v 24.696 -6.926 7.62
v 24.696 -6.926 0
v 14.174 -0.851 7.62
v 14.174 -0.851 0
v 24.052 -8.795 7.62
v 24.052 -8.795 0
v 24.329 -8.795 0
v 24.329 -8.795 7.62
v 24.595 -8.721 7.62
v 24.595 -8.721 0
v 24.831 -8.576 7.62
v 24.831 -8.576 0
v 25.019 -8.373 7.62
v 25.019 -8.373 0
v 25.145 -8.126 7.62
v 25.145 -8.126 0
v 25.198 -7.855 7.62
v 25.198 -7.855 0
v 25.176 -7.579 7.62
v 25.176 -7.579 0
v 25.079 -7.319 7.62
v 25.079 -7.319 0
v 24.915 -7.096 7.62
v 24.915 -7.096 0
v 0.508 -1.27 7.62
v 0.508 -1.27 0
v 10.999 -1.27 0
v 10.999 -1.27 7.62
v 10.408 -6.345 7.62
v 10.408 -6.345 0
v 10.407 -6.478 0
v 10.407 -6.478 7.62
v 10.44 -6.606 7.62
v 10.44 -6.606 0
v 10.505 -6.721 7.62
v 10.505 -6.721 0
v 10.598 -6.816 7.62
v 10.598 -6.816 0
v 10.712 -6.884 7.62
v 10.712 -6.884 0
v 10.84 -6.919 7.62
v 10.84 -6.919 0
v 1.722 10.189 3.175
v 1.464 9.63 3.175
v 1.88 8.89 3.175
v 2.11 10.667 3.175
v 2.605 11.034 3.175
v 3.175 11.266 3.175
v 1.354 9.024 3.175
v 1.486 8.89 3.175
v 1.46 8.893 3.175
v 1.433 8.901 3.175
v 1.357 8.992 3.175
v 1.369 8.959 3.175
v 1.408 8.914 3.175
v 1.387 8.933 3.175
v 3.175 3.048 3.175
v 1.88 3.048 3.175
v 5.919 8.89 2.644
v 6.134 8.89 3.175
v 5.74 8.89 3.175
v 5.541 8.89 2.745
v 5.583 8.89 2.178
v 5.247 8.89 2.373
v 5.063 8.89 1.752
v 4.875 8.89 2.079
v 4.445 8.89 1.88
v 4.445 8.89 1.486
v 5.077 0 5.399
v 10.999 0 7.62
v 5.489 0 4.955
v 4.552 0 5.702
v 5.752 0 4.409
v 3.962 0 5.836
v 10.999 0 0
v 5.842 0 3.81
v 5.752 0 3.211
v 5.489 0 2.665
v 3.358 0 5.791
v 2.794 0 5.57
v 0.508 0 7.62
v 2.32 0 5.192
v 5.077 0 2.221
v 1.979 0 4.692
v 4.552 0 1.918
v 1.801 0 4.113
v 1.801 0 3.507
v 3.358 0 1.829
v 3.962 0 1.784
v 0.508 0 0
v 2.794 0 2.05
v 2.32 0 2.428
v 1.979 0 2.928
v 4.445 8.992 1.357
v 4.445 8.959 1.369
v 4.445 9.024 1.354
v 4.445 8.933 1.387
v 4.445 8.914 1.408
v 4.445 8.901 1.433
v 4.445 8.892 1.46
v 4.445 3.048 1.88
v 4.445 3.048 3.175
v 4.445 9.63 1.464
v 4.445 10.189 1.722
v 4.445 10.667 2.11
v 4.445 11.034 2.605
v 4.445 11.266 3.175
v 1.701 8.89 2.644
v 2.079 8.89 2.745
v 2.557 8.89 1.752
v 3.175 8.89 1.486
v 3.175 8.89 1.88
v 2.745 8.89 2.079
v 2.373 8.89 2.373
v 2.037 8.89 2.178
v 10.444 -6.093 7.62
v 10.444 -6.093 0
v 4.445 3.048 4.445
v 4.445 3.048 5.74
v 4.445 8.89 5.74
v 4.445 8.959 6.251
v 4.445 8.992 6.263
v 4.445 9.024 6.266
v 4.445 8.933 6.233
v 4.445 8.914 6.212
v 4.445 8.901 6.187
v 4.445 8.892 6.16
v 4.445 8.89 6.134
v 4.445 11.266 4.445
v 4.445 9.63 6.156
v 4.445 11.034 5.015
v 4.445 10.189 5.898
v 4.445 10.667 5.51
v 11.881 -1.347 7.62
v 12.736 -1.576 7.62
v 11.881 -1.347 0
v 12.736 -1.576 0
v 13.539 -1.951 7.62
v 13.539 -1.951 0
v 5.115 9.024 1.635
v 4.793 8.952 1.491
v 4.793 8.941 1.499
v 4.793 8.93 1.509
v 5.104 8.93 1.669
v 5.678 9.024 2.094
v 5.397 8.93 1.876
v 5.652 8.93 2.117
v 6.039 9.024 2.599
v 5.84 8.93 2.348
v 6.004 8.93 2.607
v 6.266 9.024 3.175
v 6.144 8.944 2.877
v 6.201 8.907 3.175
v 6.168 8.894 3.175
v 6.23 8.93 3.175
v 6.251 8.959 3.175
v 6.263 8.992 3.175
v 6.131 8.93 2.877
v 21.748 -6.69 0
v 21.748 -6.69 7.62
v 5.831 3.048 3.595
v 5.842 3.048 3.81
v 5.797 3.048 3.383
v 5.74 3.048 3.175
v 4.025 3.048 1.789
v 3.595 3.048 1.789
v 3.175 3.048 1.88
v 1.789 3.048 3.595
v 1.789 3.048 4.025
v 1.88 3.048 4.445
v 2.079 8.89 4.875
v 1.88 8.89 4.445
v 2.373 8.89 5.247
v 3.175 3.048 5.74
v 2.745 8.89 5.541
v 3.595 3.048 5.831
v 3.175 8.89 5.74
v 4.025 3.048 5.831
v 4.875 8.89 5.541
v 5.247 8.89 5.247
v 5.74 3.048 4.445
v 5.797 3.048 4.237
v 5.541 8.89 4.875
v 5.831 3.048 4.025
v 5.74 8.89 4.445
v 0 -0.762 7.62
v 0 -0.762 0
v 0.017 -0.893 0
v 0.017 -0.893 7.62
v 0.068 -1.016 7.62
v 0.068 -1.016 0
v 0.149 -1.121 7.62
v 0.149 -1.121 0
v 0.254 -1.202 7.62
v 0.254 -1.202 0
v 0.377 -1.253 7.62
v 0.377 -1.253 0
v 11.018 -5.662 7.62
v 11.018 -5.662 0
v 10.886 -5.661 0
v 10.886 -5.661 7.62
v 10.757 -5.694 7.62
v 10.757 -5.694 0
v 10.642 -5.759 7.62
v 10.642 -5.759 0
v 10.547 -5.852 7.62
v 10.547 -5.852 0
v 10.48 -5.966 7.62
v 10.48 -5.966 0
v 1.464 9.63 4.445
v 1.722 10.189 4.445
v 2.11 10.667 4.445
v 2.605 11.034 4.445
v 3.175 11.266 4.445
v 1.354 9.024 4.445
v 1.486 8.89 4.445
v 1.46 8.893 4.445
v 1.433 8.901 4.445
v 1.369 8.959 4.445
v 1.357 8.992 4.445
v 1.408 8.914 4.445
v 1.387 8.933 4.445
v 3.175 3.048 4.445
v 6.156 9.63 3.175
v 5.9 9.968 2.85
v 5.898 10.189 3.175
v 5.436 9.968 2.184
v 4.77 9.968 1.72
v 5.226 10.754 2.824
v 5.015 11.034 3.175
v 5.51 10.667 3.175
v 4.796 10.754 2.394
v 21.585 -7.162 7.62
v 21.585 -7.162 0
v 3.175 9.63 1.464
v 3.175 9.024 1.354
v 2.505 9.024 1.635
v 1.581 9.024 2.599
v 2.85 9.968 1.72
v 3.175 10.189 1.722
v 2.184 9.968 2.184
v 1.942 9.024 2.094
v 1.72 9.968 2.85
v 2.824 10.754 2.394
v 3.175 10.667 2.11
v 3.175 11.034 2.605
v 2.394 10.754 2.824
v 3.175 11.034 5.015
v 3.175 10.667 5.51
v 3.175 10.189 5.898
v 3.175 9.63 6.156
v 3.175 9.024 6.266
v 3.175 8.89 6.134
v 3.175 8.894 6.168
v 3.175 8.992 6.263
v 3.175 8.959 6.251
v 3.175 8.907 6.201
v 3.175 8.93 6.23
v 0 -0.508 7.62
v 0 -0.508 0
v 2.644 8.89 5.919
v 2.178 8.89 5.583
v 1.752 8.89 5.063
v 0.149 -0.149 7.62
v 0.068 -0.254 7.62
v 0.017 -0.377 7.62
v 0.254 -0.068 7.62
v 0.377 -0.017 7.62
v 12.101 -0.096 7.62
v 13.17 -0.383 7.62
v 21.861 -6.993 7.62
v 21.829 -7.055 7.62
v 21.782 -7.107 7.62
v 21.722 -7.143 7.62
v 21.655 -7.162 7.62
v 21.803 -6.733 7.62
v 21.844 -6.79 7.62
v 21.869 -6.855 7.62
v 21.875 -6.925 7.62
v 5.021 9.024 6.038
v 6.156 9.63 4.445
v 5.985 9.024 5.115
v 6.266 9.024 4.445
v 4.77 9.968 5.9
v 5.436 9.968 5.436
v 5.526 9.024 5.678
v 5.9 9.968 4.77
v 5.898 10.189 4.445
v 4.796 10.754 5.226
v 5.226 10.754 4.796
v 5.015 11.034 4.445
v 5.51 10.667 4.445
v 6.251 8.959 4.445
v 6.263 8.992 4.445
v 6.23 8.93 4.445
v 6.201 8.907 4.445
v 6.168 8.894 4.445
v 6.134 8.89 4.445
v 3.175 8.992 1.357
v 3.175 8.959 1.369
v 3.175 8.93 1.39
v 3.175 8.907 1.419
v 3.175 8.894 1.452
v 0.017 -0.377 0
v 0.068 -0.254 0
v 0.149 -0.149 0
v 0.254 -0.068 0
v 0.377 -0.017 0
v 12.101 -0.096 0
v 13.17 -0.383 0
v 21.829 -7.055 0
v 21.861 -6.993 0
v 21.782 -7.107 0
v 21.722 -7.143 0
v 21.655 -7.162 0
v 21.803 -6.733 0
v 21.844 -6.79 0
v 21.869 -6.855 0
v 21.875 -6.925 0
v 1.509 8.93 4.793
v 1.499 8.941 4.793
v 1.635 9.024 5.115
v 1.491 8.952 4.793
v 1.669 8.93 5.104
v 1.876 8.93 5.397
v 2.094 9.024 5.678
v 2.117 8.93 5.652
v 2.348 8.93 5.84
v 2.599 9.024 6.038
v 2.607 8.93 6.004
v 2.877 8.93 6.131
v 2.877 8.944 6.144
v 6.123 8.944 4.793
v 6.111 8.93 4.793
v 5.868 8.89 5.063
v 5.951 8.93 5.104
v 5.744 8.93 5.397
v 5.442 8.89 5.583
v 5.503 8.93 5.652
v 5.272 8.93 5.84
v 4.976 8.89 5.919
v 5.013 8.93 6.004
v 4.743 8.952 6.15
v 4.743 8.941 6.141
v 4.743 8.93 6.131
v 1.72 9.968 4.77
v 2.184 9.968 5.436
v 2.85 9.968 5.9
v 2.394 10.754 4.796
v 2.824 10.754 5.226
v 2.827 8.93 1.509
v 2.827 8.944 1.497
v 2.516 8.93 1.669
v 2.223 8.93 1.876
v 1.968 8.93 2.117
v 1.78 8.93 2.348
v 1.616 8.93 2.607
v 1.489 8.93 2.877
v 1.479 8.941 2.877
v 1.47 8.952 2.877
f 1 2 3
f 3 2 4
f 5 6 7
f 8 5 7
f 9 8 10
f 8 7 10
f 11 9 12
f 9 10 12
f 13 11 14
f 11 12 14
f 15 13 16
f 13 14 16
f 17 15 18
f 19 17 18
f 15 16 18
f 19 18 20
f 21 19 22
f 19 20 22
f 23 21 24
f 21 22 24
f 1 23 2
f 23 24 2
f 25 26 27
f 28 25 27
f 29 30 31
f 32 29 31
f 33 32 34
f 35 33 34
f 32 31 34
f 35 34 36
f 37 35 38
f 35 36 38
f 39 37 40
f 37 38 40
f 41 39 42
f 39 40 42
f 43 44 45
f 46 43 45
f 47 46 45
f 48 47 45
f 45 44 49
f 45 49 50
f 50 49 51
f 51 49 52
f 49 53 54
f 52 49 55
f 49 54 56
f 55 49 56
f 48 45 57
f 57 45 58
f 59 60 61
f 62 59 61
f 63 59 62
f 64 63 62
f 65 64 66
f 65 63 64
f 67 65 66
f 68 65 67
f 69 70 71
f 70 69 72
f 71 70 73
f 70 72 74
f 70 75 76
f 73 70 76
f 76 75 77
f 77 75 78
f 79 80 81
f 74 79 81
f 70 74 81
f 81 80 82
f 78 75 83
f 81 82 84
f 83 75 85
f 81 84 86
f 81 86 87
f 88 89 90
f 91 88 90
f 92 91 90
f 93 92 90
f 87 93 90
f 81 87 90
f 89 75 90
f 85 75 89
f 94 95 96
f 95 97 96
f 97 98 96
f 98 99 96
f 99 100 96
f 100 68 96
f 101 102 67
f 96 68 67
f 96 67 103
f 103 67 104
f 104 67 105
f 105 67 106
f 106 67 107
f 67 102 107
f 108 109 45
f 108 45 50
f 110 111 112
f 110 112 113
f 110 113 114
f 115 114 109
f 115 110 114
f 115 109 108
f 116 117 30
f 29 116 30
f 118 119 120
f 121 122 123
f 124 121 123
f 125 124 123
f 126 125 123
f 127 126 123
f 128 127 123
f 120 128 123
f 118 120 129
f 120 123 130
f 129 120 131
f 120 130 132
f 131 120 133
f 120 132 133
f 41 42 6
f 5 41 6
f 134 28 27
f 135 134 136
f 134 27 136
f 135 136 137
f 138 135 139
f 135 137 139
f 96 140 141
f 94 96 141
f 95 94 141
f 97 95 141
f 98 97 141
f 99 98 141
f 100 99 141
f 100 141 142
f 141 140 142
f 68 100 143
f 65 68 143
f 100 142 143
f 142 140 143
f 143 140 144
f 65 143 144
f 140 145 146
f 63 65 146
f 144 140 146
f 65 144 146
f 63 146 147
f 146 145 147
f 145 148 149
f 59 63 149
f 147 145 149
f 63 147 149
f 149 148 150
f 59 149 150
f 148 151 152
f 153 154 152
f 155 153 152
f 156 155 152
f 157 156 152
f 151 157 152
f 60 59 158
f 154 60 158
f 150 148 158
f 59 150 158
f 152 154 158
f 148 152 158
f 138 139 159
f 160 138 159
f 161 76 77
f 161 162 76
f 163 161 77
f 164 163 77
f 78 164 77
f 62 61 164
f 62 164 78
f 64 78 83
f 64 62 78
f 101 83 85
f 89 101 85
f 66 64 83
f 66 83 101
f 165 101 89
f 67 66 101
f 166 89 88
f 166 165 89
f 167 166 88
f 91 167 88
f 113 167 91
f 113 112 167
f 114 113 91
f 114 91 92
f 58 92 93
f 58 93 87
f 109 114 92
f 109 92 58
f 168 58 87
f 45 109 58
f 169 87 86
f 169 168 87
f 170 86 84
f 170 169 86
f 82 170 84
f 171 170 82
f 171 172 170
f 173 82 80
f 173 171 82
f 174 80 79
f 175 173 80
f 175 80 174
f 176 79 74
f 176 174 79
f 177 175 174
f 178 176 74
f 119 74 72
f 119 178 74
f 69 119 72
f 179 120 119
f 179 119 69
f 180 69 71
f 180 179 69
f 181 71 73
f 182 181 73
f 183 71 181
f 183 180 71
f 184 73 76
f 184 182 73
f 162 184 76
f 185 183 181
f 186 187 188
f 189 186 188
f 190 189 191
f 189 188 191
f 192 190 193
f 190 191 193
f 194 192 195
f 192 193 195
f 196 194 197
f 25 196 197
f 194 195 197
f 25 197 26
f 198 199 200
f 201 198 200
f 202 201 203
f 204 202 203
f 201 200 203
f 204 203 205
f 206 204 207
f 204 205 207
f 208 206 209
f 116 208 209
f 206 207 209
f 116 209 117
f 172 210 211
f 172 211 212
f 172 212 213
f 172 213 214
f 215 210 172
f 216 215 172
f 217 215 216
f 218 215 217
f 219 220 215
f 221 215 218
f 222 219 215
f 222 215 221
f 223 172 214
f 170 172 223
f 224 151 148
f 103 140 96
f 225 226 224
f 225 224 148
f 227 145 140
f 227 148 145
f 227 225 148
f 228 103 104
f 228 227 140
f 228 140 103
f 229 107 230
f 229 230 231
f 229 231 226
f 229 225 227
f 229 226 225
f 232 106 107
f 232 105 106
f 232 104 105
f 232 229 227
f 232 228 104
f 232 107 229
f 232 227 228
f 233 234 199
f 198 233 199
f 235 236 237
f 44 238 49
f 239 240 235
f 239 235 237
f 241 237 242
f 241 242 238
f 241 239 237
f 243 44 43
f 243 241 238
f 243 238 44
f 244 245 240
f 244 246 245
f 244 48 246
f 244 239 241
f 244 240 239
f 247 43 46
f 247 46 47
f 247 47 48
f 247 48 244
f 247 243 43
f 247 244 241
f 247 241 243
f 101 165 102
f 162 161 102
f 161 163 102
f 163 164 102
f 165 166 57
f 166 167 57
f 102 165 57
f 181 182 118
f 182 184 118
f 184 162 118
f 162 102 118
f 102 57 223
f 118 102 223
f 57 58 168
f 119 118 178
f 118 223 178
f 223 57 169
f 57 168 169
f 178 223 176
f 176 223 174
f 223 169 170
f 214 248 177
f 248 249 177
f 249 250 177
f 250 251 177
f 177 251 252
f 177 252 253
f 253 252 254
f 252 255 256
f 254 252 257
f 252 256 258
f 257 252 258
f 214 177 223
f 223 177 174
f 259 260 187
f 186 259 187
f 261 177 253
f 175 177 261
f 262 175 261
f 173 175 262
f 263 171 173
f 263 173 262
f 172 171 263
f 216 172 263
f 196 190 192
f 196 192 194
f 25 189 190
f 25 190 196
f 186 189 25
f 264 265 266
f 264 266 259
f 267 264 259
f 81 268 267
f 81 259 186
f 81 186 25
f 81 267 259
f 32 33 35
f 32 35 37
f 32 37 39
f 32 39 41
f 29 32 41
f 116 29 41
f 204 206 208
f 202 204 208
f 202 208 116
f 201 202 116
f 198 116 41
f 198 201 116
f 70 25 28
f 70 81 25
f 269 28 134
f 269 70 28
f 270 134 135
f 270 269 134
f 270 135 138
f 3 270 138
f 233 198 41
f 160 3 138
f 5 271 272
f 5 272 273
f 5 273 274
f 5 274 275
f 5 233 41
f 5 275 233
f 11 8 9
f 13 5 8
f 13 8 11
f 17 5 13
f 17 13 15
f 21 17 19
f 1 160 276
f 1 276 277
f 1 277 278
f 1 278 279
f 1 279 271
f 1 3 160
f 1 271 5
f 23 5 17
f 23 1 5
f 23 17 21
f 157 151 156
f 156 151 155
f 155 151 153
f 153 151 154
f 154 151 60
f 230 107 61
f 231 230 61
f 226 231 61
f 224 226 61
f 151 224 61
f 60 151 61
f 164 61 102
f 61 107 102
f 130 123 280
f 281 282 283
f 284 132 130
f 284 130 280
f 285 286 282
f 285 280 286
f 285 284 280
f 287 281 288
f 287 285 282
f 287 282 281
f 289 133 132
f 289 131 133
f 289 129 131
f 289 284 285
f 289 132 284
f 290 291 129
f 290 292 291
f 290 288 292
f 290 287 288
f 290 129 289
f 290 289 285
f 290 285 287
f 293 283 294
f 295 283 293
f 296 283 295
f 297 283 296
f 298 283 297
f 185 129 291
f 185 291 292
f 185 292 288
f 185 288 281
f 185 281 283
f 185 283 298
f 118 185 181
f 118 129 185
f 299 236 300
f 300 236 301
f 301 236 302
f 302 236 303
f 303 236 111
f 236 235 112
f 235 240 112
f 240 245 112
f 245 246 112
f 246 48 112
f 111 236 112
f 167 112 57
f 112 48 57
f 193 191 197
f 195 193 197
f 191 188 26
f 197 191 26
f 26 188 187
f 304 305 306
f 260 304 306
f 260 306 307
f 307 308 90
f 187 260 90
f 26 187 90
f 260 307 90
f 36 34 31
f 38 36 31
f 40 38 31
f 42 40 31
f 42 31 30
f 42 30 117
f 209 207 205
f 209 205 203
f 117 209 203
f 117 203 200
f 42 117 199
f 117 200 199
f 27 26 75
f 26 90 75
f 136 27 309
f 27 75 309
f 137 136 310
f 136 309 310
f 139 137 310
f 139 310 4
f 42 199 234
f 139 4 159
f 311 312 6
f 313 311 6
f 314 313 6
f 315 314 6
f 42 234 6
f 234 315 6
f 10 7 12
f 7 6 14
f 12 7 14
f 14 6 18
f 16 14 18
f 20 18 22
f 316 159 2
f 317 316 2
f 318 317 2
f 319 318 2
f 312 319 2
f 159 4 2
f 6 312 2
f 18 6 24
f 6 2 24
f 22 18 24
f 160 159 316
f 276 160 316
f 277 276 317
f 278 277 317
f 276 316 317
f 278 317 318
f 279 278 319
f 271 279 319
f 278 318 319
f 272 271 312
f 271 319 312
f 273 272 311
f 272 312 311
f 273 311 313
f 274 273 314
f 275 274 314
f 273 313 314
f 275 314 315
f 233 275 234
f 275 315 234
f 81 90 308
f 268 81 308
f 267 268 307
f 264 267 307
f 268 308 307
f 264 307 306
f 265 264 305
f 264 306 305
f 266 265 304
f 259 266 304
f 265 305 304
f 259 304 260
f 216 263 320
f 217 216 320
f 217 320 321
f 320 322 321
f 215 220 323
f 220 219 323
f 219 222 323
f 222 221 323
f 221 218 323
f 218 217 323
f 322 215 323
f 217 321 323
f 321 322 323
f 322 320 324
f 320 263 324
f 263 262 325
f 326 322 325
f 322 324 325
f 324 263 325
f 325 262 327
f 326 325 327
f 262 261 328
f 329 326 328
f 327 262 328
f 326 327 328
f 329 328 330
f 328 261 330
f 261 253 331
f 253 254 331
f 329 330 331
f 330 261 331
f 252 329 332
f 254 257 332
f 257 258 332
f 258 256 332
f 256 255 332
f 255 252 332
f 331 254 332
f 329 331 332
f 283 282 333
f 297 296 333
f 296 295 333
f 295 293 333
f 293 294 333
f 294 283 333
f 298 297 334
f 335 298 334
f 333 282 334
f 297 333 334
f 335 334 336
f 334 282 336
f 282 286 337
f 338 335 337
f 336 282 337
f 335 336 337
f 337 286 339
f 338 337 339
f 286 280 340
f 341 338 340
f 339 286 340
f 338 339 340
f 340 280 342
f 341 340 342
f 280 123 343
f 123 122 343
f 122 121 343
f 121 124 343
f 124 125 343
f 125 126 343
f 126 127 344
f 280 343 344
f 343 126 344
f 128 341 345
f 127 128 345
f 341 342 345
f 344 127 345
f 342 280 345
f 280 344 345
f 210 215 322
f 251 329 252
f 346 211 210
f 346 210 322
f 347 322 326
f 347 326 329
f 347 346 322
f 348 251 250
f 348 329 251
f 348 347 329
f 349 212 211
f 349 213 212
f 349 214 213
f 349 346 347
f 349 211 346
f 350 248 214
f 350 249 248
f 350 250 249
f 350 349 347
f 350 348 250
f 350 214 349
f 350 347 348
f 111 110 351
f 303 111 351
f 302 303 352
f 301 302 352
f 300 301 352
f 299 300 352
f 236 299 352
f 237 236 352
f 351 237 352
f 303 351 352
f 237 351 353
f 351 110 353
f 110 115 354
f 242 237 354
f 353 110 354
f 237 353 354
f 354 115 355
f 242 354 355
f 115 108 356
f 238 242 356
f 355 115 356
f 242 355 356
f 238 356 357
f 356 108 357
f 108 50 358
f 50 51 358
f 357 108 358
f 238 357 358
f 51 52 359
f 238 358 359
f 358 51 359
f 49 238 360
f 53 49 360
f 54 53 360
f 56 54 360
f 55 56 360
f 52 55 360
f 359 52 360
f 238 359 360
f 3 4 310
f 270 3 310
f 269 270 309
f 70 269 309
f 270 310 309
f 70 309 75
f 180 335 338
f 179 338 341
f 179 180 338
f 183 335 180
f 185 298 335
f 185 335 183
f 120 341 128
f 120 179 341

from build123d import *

# Parameters (mm, degrees)
F1_DEPTH  = 7.62
F3_W      = 0.635
F3_H      = 5.842
F6_DEPTH  = 12.7
F7_R      = 0.127
F9_W      = 10.16
F9_H      = 1.27
F10_DEPTH = 3.175


with BuildPart() as f1:
    # F0 (on Top) → F1 (new body)
    with BuildSketch(Plane.XY):
        with BuildLine():
            Line((10.9985226281, 0), (0.508, 0))
            ThreePointArc((0.508, 0), (0.1487897552, -0.1487897552), (0, -0.508))
            Line((0, -0.508), (0, -0.762))
            ThreePointArc((0, -0.762), (0.1487897552, -1.1212102448), (0.508, -1.27))
            Line((0.508, -1.27), (10.9985226281, -1.27))
            ThreePointArc((10.9985226281, -1.27), (12.3133233772, -1.4430968025), (13.5385226281, -1.9505909488))
            Line((13.5385226281, -1.9505909488), (21.7479125756, -6.6902844449))
            ThreePointArc((21.7479125756, -6.6902844449), (21.8610174728, -6.9931140452), (21.5852173248, -7.1617342188))
            Line((21.5852173248, -7.1617342188), (11.0182697374, -5.6618500829))
            ThreePointArc((11.0182697374, -5.6618500829), (10.6417144767, -5.7586825509), (10.4439205931, -6.093418224))
            Line((10.4439205931, -6.093418224), (10.4082253422, -6.3448975453))
            ThreePointArc((10.4082253422, -6.3448975453), (10.5050578102, -6.7214528061), (10.8397934833, -6.9192466897))
            Line((10.8397934833, -6.9192466897), (24.0516598784, -8.7945535034))
            ThreePointArc((24.0516598784, -8.7945535034), (25.144685653, -8.1262935433), (24.6964387295, -6.9261471298))
            Line((24.6964387295, -6.9261471298), (14.1735226281, -0.850738686))
            ThreePointArc((14.1735226281, -0.850738686), (12.6420235645, -0.2163710031), (10.9985226281, 0))
        make_face()
    extrude(amount=F1_DEPTH)

    # F3 (on offset) → F4 (revolve)
    with BuildSketch(Plane.XY.offset(3.81)):
        Polygon((3.81, 3.048), (3.81, 0), (5.842, 0), (5.842, 8.89), (4.445, 8.89), (4.445, 3.048), align=None)
        with BuildLine():
            Line((4.445, 8.89), (5.842, 8.89))
            Line((5.842, 8.89), (6.35, 8.89))
            ThreePointArc((6.35, 8.89), (5.8180463142, 10.4454259867), (4.445, 11.3493444248))
            Line((4.445, 11.3493444248), (4.445, 8.89))
        make_face()
        with BuildLine():
            Line((3.81, 11.43), (3.81, 8.89))
            Line((3.81, 8.89), (4.445, 8.89))
            Line((4.445, 8.89), (4.445, 11.3493444248))
            ThreePointArc((4.445, 11.3493444248), (4.1300509029, 11.4097554285), (3.81, 11.43))
        make_face()
        with Locations((4.1275, 5.969)):
            Rectangle(F3_W, F3_H)
    revolve(axis=Axis((3.81, 4.445, 3.81), (0, 1, 0)))

    # F5 (on offset) → F6 (cut, symmetric)
    with BuildSketch(Plane.XY.offset(3.81)):
        Polygon((3.175, 3.048), (3.81, 3.048), (4.445, 3.048), (4.445, 13.208), (3.175, 13.208), align=None)
    extrude(amount=F6_DEPTH, both=True, mode=Mode.SUBTRACT)

    # F7
    f7_edges = [f1.edges().sort_by_distance(p)[0] for p in [
        (1.27, 8.89, 3.81),
        (6.35, 8.89, 3.81),
    ]]
    fillet(f7_edges, radius=F7_R)

    # F9 (on offset) → F10 (cut, symmetric)
    with BuildSketch(Plane(origin=(3.81, 0, 0), x_dir=(0, -1, 0), z_dir=(-1, 0, 0))):
        with Locations((-8.128, 3.81)):
            Rectangle(F9_W, F9_H)
    extrude(amount=F10_DEPTH, both=True, mode=Mode.SUBTRACT)


solid = f1.part
